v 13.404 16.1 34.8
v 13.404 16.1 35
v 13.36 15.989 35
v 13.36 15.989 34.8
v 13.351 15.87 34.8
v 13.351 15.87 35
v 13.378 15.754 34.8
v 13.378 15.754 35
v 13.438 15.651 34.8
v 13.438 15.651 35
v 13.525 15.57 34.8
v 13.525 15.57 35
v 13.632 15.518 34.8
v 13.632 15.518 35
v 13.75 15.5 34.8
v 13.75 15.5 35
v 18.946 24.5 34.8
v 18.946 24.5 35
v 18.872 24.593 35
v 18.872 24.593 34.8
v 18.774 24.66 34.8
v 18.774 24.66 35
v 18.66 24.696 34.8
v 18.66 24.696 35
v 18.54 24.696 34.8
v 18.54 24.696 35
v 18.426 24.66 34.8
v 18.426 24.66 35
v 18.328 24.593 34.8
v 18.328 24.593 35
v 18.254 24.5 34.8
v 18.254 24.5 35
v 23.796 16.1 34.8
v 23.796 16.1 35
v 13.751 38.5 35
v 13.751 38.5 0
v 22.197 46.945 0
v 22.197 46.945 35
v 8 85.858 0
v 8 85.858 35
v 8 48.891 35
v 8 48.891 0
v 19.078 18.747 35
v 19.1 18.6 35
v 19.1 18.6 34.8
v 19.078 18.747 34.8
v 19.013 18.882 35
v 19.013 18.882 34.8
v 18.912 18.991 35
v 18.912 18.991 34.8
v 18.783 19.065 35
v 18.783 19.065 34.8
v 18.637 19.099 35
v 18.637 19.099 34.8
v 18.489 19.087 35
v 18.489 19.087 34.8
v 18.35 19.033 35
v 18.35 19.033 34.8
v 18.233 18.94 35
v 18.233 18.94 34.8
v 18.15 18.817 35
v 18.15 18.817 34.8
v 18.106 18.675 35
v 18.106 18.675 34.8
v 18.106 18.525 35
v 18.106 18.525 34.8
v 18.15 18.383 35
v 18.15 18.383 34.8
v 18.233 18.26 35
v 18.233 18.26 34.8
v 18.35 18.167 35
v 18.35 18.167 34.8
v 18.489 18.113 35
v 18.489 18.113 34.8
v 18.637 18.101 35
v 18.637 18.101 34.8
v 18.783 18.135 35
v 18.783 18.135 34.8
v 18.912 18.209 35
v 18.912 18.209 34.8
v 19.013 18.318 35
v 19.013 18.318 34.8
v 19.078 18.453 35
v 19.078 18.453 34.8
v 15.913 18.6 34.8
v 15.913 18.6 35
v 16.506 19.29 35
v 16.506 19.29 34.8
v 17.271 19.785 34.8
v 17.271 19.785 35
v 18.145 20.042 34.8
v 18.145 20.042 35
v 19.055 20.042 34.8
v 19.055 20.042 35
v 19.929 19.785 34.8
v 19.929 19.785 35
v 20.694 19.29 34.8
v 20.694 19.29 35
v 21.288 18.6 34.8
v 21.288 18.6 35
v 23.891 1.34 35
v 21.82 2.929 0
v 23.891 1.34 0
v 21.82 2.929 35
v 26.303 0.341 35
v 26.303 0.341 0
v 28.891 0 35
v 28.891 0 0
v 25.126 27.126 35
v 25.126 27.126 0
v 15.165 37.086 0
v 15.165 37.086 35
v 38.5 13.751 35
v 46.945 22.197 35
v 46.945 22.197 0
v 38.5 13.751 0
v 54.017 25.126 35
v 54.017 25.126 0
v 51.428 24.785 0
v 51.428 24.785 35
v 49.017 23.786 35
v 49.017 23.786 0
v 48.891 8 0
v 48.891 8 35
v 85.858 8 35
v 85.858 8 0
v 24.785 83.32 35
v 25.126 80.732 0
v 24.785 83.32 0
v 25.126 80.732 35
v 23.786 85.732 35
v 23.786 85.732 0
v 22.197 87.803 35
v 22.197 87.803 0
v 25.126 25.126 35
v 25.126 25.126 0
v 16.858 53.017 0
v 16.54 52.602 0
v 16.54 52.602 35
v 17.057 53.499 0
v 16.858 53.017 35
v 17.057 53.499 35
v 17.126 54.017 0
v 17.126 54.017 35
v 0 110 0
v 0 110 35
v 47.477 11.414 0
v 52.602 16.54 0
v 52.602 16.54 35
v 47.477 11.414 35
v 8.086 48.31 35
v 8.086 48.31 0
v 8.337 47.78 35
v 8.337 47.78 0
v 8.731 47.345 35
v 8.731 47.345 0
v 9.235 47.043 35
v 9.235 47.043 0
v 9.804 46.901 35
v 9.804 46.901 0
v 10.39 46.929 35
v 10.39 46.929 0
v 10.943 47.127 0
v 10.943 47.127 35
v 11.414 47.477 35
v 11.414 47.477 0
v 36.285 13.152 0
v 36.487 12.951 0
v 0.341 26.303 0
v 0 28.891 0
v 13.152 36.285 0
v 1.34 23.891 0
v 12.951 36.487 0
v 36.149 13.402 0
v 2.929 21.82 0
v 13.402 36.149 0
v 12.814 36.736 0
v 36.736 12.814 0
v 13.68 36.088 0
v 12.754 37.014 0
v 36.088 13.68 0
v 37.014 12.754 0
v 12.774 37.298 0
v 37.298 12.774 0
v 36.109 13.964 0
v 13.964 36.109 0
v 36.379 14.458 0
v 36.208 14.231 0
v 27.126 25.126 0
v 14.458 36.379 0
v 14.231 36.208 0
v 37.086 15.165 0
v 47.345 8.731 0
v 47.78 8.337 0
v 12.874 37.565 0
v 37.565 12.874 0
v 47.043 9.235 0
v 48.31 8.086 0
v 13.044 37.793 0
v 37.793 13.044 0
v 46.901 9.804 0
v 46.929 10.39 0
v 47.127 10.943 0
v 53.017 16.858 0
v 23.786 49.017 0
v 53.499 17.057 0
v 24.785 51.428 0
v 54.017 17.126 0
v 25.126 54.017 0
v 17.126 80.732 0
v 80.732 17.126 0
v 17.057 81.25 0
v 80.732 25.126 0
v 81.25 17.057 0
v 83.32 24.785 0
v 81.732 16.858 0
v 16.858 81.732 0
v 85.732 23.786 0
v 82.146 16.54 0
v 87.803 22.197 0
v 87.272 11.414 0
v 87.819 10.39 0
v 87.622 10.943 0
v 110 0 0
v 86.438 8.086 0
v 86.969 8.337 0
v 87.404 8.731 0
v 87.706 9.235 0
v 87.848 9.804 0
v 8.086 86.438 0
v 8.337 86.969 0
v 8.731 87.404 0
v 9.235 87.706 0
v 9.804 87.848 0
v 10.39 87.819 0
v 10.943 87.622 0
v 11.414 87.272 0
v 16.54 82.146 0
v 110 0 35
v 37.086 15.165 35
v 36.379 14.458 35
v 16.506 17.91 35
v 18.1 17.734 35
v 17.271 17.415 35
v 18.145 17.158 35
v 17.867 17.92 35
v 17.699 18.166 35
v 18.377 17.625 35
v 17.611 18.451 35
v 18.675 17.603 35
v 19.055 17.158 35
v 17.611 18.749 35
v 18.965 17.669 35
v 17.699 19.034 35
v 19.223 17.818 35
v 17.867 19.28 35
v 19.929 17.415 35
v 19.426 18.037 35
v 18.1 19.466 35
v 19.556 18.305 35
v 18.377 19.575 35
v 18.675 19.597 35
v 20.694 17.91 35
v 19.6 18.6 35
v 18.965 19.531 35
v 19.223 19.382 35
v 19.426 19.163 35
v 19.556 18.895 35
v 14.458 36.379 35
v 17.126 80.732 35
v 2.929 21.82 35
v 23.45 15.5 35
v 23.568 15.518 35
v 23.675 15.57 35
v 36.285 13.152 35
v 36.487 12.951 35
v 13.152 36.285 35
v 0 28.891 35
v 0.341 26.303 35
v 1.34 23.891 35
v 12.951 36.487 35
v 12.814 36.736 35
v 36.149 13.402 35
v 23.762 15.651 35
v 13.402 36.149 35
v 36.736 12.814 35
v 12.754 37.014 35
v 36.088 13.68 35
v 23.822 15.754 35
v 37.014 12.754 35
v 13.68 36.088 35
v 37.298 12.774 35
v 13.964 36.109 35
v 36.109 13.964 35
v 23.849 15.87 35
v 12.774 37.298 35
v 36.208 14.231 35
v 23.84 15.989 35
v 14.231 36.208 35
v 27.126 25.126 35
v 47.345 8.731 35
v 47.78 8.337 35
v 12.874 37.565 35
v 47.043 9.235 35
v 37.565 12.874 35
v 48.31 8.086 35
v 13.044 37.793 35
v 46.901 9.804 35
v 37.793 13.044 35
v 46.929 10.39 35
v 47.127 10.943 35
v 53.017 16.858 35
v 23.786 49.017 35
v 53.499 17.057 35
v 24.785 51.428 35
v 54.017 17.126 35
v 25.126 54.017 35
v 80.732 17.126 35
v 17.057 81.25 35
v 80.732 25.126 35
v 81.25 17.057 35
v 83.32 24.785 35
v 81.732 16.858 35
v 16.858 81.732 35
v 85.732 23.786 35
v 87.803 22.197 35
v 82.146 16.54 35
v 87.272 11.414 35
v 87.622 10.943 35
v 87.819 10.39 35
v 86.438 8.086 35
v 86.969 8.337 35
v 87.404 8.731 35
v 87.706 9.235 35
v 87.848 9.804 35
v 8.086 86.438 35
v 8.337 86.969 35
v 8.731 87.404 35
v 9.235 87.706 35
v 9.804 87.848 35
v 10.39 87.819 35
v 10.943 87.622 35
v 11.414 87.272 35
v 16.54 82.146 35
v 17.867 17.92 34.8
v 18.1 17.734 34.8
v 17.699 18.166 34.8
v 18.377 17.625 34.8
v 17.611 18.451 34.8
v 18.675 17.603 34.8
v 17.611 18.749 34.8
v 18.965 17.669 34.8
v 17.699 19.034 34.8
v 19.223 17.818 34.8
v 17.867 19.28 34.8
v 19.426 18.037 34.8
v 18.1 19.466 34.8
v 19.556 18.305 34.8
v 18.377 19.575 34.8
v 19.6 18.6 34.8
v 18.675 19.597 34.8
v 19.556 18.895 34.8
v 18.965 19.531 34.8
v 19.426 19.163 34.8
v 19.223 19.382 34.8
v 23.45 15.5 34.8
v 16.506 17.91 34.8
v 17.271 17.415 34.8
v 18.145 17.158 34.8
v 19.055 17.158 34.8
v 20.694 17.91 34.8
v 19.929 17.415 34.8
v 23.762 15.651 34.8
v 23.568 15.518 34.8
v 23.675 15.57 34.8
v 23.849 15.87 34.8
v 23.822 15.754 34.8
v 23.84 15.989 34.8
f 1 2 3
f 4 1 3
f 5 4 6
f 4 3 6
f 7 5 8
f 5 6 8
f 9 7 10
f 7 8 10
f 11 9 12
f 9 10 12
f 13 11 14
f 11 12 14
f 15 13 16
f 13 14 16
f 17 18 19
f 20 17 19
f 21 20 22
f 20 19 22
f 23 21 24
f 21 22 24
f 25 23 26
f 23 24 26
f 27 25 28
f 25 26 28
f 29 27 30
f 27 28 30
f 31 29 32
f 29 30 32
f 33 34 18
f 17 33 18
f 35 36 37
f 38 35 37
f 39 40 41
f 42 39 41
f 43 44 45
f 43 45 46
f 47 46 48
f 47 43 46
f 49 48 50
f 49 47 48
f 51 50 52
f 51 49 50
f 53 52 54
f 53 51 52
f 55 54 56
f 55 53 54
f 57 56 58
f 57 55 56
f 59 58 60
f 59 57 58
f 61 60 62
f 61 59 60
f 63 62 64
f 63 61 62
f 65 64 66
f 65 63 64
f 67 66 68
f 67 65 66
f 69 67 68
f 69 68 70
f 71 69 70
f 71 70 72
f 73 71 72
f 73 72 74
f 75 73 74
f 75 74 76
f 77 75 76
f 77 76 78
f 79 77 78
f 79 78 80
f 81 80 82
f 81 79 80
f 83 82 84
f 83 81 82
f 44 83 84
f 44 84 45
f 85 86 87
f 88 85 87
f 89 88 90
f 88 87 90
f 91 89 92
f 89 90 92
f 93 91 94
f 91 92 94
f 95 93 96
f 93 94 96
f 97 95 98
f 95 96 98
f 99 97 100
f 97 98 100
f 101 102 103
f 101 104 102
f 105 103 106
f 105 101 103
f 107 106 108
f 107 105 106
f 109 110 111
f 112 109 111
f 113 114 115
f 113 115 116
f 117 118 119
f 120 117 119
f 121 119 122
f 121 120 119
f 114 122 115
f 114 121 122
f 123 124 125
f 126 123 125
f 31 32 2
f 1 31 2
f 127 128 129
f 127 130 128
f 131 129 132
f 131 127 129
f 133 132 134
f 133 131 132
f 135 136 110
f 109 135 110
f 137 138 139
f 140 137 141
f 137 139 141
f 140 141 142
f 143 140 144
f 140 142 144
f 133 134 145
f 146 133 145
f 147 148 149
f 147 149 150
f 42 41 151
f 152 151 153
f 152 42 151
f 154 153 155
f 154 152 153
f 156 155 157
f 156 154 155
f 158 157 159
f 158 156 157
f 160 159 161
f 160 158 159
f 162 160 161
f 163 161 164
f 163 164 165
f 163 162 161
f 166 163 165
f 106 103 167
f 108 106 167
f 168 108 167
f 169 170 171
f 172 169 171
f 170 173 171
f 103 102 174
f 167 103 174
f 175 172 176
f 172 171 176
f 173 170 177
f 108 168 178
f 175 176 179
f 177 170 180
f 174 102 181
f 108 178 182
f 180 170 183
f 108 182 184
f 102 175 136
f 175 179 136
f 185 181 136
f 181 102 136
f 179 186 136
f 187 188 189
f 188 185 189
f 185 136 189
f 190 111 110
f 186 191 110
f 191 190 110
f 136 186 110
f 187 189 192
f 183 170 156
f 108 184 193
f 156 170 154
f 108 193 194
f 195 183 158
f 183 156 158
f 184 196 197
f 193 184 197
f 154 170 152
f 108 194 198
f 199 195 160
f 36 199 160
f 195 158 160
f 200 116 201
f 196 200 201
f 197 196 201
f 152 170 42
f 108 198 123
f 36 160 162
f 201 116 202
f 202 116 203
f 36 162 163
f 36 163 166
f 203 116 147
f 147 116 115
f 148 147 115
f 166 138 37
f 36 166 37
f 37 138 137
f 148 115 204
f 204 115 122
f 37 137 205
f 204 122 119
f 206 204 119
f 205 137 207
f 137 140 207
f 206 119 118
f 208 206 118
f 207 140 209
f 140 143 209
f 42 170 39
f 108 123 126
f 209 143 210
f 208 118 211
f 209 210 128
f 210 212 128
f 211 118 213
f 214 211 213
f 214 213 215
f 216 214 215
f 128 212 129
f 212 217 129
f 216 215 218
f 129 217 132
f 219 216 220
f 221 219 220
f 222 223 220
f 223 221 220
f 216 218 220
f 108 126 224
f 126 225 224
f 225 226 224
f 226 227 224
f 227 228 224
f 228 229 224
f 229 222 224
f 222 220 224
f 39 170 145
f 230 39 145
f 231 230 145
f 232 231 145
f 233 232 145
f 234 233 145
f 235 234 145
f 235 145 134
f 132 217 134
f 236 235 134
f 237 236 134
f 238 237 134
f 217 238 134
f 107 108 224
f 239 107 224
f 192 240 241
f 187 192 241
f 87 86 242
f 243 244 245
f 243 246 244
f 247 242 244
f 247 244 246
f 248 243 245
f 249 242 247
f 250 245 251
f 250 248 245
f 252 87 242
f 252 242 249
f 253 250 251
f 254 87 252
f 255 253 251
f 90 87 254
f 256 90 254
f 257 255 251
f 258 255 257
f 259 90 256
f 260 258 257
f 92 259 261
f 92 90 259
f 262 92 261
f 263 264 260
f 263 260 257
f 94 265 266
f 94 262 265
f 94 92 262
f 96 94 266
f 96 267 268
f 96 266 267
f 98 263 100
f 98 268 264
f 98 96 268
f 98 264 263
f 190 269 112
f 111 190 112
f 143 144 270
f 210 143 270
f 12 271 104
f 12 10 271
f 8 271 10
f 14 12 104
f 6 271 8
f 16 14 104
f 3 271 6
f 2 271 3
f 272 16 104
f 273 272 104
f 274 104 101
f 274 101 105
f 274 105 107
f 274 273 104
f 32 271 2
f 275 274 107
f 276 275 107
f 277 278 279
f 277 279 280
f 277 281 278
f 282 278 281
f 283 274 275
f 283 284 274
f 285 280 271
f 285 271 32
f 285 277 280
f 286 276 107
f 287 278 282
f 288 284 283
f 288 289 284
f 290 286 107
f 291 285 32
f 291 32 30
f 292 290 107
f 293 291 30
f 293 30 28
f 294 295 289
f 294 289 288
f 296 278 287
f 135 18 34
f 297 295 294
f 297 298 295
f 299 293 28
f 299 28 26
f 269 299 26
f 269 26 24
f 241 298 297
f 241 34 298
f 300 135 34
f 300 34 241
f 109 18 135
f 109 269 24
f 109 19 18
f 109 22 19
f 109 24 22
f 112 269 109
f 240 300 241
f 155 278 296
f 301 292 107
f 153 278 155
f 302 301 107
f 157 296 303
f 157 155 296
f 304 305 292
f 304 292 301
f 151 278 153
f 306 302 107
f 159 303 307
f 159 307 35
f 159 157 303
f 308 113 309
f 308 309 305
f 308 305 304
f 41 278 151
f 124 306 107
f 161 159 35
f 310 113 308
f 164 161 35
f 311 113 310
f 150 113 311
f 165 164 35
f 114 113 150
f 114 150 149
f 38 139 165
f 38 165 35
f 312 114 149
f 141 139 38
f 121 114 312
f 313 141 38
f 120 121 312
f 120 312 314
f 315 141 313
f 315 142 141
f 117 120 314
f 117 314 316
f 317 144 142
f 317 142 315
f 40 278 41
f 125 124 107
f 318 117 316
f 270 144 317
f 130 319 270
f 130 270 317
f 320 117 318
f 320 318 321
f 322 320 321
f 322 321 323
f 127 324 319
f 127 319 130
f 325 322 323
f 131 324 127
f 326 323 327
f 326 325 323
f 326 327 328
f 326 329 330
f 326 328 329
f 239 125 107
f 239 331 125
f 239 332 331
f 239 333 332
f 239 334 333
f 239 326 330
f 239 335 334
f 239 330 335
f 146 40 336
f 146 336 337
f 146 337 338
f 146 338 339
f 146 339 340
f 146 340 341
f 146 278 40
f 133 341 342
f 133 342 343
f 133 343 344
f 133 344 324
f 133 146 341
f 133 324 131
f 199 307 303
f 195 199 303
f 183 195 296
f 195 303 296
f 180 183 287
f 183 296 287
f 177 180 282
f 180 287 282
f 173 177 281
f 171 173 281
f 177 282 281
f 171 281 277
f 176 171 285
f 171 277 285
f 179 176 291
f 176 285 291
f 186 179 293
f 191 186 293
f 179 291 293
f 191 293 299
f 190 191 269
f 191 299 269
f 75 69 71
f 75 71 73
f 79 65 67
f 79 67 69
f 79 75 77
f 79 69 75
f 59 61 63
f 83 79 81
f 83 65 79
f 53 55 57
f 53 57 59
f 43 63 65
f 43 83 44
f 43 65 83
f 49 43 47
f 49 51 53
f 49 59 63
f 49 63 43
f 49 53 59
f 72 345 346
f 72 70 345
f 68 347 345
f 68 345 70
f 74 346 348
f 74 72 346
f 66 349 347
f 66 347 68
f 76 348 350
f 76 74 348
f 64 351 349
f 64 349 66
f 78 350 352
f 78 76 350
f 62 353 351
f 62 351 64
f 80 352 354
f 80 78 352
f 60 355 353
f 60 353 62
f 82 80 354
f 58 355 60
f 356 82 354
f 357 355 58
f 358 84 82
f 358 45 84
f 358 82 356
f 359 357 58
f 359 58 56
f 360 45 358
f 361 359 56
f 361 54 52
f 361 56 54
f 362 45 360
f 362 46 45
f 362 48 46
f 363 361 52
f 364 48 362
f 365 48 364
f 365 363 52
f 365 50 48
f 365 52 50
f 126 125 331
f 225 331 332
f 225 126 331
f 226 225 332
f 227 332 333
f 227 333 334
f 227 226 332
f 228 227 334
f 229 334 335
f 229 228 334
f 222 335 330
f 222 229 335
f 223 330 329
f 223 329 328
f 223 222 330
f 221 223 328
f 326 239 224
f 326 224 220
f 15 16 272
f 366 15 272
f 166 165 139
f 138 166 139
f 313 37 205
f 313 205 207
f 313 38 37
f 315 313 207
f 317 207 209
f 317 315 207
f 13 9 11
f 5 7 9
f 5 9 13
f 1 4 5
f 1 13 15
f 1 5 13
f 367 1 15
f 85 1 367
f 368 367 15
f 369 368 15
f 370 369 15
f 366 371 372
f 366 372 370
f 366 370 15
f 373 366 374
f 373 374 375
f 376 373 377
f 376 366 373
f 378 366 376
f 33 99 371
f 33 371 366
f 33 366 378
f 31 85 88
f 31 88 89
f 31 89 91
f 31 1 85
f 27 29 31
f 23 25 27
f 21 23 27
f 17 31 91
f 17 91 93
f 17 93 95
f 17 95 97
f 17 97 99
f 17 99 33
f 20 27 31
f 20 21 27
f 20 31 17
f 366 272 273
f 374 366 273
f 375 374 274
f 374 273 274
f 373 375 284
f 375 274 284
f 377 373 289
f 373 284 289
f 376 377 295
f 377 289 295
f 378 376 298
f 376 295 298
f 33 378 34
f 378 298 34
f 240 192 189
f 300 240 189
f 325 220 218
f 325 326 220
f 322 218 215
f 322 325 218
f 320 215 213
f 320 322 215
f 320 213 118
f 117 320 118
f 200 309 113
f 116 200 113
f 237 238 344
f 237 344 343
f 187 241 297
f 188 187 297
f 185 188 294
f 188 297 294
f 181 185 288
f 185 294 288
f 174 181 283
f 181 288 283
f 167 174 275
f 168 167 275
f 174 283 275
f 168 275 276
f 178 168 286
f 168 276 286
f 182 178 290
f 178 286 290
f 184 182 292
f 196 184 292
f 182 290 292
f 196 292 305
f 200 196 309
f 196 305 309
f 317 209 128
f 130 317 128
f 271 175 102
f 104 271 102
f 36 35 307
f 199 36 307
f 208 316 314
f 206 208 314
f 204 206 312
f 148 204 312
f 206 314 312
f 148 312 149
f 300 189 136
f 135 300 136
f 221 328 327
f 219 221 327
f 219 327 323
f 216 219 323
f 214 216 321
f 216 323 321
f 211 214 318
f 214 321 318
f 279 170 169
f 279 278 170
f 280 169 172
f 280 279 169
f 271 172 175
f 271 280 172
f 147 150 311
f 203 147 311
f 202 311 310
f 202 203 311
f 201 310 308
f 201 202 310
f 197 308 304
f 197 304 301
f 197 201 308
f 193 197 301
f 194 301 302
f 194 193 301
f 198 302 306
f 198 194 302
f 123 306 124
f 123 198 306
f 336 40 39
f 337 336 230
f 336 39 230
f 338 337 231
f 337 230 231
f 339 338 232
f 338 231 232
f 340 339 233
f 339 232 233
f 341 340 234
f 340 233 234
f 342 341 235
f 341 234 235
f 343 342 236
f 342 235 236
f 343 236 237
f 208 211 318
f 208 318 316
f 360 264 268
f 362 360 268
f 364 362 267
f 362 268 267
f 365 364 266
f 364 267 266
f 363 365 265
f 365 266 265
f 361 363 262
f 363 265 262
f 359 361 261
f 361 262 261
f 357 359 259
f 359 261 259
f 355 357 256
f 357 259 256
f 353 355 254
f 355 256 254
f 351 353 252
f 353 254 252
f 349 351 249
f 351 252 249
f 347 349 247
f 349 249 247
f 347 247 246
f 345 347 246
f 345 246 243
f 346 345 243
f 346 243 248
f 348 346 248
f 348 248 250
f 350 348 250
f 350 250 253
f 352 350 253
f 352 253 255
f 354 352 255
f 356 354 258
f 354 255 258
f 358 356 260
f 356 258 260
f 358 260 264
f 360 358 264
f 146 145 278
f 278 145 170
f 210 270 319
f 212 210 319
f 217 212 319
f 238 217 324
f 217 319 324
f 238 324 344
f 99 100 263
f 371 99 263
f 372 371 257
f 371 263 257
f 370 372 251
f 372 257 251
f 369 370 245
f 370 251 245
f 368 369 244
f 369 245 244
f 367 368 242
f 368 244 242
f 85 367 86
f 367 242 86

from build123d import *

# Parameters (mm, degrees)
F1_DEPTH  = 35
F2_R      = 10
F4_DEPTH  = 35.001
F6_DEPTH  = 35.001
F7_R      = 2
F9_DEPTH  = 0.2
F10_R     = 1
F10_R_2   = 0.5
F11_DEPTH = 0.2


with BuildPart() as f1:
    # F0 (on Top) → F1 (new body)
    with BuildSketch(Plane.XY):
        Polygon((0, 110), (0, 24.7487373415), (24.7487373415, 0), (110, 0), (84.8743686708, 25.1256313292), (49.8743686708, 25.1256313292), (38.5, 13.7512626585), (27.1256313292, 25.1256313292), (25.1256313292, 25.1256313292), (25.1256313292, 27.1256313292), (13.7512626585, 38.5), (25.1256313292, 49.8743686708), (25.1256313292, 84.8743686708), align=None)
    extrude(amount=F1_DEPTH)

    # F2
    f2_edges = [f1.edges().sort_by_distance(p)[0] for p in [
        (84.874369, 25.125631, 17.5),
        (25.125631, 49.874369, 17.5),
        (25.125631, 84.874369, 17.5),
        (0, 24.748737, 17.5),
        (24.748737, 0, 17.5),
        (49.874369, 25.125631, 17.5),
    ]]
    fillet(f2_edges, radius=F2_R)

    # F3 (on face) → F4 (cut, through all)
    with BuildSketch(Plane.XY.offset(35)):
        with BuildLine():
            Line((15.1654762208, 37.0857864376), (13.7512626585, 38.5))
            Line((13.7512626585, 38.5), (13.0441558773, 37.7928932188))
            ThreePointArc((13.0441558773, 37.7928932188), (13.0441558773, 36.3786796564), (14.4583694397, 36.3786796564))
            Line((14.4583694397, 36.3786796564), (15.1654762208, 37.0857864376))
        make_face()
        with BuildLine():
            Line((37.7928932188, 13.0441558773), (38.5, 13.7512626585))
            Line((38.5, 13.7512626585), (37.0857864376, 15.1654762208))
            Line((37.0857864376, 15.1654762208), (36.3786796564, 14.4583694397))
            ThreePointArc((36.3786796564, 14.4583694397), (36.3786796564, 13.0441558773), (37.7928932188, 13.0441558773))
        make_face()
    extrude(amount=-F4_DEPTH, mode=Mode.SUBTRACT)

    # F5 (on face) → F6 (cut, through all)
    with BuildSketch(Plane.XY.offset(35)):
        with BuildLine():
            Line((8, 90.686291501), (8, 44.0624458405))
            Line((8, 44.0624458405), (16.5398448916, 52.6022907321))
            ThreePointArc((16.5398448916, 52.6022907321), (16.9733903943, 53.2511374298), (17.1256313292, 54.0165042945))
            Line((17.1256313292, 54.0165042945), (17.1256313292, 80.732233047))
            ThreePointArc((17.1256313292, 80.732233047), (16.9733903943, 81.4975999118), (16.5398448916, 82.1464466094))
            Line((16.5398448916, 82.1464466094), (8, 90.686291501))
        make_face()
        with BuildLine():
            ThreePointArc((82.1464466094, 16.5398448916), (81.4975999118, 16.9733903943), (80.732233047, 17.1256313292))
            Line((80.732233047, 17.1256313292), (54.0165042945, 17.1256313292))
            ThreePointArc((54.0165042945, 17.1256313292), (53.2511374298, 16.9733903943), (52.6022907321, 16.5398448916))
            Line((52.6022907321, 16.5398448916), (44.0624458405, 8))
            Line((44.0624458405, 8), (90.686291501, 8))
            Line((90.686291501, 8), (82.1464466094, 16.5398448916))
        make_face()
    extrude(amount=-F6_DEPTH, mode=Mode.SUBTRACT)

    # F7
    f7_edges = [f1.edges().sort_by_distance(p)[0] for p in [
        (8, 90.686292, 17.5),
        (8, 44.062446, 17.5),
        (44.062446, 8, 17.5),
        (90.686292, 8, 17.5),
    ]]
    fillet(f7_edges, radius=F7_R)

    # F8 (on face) → F9 (cut)
    with BuildSketch(Plane.XY.offset(35)):
        with BuildLine():
            ThreePointArc((18.9464101615, 24.5), (18.6, 24.7), (18.2535898385, 24.5))
            Line((18.2535898385, 24.5), (13.4038475773, 16.1))
            ThreePointArc((13.4038475773, 16.1), (13.4038475773, 15.7), (13.7502577388, 15.5))
            Line((13.7502577388, 15.5), (23.4497422612, 15.5))
            ThreePointArc((23.4497422612, 15.5), (23.7961524227, 15.7), (23.7961524227, 16.1))
            Line((23.7961524227, 16.1), (18.9464101615, 24.5))
        make_face()
        with BuildLine():
            ThreePointArc((15.9125, 18.6), (18.6, 20.075), (21.2875, 18.6))
            ThreePointArc((21.2875, 18.6), (18.6, 17.125), (15.9125, 18.6))
        make_face(mode=Mode.SUBTRACT)
    extrude(amount=-F9_DEPTH, mode=Mode.SUBTRACT)

    # F10 (on face) → F11 (cut, through all)
    with BuildSketch(Plane.XY.offset(35)):
        with Locations((18.6, 18.6)):
            Circle(F10_R)
        with Locations((18.6, 18.6)):
            Circle(F10_R_2, mode=Mode.SUBTRACT)
    extrude(amount=-F11_DEPTH, mode=Mode.SUBTRACT)


solid = f1.part
